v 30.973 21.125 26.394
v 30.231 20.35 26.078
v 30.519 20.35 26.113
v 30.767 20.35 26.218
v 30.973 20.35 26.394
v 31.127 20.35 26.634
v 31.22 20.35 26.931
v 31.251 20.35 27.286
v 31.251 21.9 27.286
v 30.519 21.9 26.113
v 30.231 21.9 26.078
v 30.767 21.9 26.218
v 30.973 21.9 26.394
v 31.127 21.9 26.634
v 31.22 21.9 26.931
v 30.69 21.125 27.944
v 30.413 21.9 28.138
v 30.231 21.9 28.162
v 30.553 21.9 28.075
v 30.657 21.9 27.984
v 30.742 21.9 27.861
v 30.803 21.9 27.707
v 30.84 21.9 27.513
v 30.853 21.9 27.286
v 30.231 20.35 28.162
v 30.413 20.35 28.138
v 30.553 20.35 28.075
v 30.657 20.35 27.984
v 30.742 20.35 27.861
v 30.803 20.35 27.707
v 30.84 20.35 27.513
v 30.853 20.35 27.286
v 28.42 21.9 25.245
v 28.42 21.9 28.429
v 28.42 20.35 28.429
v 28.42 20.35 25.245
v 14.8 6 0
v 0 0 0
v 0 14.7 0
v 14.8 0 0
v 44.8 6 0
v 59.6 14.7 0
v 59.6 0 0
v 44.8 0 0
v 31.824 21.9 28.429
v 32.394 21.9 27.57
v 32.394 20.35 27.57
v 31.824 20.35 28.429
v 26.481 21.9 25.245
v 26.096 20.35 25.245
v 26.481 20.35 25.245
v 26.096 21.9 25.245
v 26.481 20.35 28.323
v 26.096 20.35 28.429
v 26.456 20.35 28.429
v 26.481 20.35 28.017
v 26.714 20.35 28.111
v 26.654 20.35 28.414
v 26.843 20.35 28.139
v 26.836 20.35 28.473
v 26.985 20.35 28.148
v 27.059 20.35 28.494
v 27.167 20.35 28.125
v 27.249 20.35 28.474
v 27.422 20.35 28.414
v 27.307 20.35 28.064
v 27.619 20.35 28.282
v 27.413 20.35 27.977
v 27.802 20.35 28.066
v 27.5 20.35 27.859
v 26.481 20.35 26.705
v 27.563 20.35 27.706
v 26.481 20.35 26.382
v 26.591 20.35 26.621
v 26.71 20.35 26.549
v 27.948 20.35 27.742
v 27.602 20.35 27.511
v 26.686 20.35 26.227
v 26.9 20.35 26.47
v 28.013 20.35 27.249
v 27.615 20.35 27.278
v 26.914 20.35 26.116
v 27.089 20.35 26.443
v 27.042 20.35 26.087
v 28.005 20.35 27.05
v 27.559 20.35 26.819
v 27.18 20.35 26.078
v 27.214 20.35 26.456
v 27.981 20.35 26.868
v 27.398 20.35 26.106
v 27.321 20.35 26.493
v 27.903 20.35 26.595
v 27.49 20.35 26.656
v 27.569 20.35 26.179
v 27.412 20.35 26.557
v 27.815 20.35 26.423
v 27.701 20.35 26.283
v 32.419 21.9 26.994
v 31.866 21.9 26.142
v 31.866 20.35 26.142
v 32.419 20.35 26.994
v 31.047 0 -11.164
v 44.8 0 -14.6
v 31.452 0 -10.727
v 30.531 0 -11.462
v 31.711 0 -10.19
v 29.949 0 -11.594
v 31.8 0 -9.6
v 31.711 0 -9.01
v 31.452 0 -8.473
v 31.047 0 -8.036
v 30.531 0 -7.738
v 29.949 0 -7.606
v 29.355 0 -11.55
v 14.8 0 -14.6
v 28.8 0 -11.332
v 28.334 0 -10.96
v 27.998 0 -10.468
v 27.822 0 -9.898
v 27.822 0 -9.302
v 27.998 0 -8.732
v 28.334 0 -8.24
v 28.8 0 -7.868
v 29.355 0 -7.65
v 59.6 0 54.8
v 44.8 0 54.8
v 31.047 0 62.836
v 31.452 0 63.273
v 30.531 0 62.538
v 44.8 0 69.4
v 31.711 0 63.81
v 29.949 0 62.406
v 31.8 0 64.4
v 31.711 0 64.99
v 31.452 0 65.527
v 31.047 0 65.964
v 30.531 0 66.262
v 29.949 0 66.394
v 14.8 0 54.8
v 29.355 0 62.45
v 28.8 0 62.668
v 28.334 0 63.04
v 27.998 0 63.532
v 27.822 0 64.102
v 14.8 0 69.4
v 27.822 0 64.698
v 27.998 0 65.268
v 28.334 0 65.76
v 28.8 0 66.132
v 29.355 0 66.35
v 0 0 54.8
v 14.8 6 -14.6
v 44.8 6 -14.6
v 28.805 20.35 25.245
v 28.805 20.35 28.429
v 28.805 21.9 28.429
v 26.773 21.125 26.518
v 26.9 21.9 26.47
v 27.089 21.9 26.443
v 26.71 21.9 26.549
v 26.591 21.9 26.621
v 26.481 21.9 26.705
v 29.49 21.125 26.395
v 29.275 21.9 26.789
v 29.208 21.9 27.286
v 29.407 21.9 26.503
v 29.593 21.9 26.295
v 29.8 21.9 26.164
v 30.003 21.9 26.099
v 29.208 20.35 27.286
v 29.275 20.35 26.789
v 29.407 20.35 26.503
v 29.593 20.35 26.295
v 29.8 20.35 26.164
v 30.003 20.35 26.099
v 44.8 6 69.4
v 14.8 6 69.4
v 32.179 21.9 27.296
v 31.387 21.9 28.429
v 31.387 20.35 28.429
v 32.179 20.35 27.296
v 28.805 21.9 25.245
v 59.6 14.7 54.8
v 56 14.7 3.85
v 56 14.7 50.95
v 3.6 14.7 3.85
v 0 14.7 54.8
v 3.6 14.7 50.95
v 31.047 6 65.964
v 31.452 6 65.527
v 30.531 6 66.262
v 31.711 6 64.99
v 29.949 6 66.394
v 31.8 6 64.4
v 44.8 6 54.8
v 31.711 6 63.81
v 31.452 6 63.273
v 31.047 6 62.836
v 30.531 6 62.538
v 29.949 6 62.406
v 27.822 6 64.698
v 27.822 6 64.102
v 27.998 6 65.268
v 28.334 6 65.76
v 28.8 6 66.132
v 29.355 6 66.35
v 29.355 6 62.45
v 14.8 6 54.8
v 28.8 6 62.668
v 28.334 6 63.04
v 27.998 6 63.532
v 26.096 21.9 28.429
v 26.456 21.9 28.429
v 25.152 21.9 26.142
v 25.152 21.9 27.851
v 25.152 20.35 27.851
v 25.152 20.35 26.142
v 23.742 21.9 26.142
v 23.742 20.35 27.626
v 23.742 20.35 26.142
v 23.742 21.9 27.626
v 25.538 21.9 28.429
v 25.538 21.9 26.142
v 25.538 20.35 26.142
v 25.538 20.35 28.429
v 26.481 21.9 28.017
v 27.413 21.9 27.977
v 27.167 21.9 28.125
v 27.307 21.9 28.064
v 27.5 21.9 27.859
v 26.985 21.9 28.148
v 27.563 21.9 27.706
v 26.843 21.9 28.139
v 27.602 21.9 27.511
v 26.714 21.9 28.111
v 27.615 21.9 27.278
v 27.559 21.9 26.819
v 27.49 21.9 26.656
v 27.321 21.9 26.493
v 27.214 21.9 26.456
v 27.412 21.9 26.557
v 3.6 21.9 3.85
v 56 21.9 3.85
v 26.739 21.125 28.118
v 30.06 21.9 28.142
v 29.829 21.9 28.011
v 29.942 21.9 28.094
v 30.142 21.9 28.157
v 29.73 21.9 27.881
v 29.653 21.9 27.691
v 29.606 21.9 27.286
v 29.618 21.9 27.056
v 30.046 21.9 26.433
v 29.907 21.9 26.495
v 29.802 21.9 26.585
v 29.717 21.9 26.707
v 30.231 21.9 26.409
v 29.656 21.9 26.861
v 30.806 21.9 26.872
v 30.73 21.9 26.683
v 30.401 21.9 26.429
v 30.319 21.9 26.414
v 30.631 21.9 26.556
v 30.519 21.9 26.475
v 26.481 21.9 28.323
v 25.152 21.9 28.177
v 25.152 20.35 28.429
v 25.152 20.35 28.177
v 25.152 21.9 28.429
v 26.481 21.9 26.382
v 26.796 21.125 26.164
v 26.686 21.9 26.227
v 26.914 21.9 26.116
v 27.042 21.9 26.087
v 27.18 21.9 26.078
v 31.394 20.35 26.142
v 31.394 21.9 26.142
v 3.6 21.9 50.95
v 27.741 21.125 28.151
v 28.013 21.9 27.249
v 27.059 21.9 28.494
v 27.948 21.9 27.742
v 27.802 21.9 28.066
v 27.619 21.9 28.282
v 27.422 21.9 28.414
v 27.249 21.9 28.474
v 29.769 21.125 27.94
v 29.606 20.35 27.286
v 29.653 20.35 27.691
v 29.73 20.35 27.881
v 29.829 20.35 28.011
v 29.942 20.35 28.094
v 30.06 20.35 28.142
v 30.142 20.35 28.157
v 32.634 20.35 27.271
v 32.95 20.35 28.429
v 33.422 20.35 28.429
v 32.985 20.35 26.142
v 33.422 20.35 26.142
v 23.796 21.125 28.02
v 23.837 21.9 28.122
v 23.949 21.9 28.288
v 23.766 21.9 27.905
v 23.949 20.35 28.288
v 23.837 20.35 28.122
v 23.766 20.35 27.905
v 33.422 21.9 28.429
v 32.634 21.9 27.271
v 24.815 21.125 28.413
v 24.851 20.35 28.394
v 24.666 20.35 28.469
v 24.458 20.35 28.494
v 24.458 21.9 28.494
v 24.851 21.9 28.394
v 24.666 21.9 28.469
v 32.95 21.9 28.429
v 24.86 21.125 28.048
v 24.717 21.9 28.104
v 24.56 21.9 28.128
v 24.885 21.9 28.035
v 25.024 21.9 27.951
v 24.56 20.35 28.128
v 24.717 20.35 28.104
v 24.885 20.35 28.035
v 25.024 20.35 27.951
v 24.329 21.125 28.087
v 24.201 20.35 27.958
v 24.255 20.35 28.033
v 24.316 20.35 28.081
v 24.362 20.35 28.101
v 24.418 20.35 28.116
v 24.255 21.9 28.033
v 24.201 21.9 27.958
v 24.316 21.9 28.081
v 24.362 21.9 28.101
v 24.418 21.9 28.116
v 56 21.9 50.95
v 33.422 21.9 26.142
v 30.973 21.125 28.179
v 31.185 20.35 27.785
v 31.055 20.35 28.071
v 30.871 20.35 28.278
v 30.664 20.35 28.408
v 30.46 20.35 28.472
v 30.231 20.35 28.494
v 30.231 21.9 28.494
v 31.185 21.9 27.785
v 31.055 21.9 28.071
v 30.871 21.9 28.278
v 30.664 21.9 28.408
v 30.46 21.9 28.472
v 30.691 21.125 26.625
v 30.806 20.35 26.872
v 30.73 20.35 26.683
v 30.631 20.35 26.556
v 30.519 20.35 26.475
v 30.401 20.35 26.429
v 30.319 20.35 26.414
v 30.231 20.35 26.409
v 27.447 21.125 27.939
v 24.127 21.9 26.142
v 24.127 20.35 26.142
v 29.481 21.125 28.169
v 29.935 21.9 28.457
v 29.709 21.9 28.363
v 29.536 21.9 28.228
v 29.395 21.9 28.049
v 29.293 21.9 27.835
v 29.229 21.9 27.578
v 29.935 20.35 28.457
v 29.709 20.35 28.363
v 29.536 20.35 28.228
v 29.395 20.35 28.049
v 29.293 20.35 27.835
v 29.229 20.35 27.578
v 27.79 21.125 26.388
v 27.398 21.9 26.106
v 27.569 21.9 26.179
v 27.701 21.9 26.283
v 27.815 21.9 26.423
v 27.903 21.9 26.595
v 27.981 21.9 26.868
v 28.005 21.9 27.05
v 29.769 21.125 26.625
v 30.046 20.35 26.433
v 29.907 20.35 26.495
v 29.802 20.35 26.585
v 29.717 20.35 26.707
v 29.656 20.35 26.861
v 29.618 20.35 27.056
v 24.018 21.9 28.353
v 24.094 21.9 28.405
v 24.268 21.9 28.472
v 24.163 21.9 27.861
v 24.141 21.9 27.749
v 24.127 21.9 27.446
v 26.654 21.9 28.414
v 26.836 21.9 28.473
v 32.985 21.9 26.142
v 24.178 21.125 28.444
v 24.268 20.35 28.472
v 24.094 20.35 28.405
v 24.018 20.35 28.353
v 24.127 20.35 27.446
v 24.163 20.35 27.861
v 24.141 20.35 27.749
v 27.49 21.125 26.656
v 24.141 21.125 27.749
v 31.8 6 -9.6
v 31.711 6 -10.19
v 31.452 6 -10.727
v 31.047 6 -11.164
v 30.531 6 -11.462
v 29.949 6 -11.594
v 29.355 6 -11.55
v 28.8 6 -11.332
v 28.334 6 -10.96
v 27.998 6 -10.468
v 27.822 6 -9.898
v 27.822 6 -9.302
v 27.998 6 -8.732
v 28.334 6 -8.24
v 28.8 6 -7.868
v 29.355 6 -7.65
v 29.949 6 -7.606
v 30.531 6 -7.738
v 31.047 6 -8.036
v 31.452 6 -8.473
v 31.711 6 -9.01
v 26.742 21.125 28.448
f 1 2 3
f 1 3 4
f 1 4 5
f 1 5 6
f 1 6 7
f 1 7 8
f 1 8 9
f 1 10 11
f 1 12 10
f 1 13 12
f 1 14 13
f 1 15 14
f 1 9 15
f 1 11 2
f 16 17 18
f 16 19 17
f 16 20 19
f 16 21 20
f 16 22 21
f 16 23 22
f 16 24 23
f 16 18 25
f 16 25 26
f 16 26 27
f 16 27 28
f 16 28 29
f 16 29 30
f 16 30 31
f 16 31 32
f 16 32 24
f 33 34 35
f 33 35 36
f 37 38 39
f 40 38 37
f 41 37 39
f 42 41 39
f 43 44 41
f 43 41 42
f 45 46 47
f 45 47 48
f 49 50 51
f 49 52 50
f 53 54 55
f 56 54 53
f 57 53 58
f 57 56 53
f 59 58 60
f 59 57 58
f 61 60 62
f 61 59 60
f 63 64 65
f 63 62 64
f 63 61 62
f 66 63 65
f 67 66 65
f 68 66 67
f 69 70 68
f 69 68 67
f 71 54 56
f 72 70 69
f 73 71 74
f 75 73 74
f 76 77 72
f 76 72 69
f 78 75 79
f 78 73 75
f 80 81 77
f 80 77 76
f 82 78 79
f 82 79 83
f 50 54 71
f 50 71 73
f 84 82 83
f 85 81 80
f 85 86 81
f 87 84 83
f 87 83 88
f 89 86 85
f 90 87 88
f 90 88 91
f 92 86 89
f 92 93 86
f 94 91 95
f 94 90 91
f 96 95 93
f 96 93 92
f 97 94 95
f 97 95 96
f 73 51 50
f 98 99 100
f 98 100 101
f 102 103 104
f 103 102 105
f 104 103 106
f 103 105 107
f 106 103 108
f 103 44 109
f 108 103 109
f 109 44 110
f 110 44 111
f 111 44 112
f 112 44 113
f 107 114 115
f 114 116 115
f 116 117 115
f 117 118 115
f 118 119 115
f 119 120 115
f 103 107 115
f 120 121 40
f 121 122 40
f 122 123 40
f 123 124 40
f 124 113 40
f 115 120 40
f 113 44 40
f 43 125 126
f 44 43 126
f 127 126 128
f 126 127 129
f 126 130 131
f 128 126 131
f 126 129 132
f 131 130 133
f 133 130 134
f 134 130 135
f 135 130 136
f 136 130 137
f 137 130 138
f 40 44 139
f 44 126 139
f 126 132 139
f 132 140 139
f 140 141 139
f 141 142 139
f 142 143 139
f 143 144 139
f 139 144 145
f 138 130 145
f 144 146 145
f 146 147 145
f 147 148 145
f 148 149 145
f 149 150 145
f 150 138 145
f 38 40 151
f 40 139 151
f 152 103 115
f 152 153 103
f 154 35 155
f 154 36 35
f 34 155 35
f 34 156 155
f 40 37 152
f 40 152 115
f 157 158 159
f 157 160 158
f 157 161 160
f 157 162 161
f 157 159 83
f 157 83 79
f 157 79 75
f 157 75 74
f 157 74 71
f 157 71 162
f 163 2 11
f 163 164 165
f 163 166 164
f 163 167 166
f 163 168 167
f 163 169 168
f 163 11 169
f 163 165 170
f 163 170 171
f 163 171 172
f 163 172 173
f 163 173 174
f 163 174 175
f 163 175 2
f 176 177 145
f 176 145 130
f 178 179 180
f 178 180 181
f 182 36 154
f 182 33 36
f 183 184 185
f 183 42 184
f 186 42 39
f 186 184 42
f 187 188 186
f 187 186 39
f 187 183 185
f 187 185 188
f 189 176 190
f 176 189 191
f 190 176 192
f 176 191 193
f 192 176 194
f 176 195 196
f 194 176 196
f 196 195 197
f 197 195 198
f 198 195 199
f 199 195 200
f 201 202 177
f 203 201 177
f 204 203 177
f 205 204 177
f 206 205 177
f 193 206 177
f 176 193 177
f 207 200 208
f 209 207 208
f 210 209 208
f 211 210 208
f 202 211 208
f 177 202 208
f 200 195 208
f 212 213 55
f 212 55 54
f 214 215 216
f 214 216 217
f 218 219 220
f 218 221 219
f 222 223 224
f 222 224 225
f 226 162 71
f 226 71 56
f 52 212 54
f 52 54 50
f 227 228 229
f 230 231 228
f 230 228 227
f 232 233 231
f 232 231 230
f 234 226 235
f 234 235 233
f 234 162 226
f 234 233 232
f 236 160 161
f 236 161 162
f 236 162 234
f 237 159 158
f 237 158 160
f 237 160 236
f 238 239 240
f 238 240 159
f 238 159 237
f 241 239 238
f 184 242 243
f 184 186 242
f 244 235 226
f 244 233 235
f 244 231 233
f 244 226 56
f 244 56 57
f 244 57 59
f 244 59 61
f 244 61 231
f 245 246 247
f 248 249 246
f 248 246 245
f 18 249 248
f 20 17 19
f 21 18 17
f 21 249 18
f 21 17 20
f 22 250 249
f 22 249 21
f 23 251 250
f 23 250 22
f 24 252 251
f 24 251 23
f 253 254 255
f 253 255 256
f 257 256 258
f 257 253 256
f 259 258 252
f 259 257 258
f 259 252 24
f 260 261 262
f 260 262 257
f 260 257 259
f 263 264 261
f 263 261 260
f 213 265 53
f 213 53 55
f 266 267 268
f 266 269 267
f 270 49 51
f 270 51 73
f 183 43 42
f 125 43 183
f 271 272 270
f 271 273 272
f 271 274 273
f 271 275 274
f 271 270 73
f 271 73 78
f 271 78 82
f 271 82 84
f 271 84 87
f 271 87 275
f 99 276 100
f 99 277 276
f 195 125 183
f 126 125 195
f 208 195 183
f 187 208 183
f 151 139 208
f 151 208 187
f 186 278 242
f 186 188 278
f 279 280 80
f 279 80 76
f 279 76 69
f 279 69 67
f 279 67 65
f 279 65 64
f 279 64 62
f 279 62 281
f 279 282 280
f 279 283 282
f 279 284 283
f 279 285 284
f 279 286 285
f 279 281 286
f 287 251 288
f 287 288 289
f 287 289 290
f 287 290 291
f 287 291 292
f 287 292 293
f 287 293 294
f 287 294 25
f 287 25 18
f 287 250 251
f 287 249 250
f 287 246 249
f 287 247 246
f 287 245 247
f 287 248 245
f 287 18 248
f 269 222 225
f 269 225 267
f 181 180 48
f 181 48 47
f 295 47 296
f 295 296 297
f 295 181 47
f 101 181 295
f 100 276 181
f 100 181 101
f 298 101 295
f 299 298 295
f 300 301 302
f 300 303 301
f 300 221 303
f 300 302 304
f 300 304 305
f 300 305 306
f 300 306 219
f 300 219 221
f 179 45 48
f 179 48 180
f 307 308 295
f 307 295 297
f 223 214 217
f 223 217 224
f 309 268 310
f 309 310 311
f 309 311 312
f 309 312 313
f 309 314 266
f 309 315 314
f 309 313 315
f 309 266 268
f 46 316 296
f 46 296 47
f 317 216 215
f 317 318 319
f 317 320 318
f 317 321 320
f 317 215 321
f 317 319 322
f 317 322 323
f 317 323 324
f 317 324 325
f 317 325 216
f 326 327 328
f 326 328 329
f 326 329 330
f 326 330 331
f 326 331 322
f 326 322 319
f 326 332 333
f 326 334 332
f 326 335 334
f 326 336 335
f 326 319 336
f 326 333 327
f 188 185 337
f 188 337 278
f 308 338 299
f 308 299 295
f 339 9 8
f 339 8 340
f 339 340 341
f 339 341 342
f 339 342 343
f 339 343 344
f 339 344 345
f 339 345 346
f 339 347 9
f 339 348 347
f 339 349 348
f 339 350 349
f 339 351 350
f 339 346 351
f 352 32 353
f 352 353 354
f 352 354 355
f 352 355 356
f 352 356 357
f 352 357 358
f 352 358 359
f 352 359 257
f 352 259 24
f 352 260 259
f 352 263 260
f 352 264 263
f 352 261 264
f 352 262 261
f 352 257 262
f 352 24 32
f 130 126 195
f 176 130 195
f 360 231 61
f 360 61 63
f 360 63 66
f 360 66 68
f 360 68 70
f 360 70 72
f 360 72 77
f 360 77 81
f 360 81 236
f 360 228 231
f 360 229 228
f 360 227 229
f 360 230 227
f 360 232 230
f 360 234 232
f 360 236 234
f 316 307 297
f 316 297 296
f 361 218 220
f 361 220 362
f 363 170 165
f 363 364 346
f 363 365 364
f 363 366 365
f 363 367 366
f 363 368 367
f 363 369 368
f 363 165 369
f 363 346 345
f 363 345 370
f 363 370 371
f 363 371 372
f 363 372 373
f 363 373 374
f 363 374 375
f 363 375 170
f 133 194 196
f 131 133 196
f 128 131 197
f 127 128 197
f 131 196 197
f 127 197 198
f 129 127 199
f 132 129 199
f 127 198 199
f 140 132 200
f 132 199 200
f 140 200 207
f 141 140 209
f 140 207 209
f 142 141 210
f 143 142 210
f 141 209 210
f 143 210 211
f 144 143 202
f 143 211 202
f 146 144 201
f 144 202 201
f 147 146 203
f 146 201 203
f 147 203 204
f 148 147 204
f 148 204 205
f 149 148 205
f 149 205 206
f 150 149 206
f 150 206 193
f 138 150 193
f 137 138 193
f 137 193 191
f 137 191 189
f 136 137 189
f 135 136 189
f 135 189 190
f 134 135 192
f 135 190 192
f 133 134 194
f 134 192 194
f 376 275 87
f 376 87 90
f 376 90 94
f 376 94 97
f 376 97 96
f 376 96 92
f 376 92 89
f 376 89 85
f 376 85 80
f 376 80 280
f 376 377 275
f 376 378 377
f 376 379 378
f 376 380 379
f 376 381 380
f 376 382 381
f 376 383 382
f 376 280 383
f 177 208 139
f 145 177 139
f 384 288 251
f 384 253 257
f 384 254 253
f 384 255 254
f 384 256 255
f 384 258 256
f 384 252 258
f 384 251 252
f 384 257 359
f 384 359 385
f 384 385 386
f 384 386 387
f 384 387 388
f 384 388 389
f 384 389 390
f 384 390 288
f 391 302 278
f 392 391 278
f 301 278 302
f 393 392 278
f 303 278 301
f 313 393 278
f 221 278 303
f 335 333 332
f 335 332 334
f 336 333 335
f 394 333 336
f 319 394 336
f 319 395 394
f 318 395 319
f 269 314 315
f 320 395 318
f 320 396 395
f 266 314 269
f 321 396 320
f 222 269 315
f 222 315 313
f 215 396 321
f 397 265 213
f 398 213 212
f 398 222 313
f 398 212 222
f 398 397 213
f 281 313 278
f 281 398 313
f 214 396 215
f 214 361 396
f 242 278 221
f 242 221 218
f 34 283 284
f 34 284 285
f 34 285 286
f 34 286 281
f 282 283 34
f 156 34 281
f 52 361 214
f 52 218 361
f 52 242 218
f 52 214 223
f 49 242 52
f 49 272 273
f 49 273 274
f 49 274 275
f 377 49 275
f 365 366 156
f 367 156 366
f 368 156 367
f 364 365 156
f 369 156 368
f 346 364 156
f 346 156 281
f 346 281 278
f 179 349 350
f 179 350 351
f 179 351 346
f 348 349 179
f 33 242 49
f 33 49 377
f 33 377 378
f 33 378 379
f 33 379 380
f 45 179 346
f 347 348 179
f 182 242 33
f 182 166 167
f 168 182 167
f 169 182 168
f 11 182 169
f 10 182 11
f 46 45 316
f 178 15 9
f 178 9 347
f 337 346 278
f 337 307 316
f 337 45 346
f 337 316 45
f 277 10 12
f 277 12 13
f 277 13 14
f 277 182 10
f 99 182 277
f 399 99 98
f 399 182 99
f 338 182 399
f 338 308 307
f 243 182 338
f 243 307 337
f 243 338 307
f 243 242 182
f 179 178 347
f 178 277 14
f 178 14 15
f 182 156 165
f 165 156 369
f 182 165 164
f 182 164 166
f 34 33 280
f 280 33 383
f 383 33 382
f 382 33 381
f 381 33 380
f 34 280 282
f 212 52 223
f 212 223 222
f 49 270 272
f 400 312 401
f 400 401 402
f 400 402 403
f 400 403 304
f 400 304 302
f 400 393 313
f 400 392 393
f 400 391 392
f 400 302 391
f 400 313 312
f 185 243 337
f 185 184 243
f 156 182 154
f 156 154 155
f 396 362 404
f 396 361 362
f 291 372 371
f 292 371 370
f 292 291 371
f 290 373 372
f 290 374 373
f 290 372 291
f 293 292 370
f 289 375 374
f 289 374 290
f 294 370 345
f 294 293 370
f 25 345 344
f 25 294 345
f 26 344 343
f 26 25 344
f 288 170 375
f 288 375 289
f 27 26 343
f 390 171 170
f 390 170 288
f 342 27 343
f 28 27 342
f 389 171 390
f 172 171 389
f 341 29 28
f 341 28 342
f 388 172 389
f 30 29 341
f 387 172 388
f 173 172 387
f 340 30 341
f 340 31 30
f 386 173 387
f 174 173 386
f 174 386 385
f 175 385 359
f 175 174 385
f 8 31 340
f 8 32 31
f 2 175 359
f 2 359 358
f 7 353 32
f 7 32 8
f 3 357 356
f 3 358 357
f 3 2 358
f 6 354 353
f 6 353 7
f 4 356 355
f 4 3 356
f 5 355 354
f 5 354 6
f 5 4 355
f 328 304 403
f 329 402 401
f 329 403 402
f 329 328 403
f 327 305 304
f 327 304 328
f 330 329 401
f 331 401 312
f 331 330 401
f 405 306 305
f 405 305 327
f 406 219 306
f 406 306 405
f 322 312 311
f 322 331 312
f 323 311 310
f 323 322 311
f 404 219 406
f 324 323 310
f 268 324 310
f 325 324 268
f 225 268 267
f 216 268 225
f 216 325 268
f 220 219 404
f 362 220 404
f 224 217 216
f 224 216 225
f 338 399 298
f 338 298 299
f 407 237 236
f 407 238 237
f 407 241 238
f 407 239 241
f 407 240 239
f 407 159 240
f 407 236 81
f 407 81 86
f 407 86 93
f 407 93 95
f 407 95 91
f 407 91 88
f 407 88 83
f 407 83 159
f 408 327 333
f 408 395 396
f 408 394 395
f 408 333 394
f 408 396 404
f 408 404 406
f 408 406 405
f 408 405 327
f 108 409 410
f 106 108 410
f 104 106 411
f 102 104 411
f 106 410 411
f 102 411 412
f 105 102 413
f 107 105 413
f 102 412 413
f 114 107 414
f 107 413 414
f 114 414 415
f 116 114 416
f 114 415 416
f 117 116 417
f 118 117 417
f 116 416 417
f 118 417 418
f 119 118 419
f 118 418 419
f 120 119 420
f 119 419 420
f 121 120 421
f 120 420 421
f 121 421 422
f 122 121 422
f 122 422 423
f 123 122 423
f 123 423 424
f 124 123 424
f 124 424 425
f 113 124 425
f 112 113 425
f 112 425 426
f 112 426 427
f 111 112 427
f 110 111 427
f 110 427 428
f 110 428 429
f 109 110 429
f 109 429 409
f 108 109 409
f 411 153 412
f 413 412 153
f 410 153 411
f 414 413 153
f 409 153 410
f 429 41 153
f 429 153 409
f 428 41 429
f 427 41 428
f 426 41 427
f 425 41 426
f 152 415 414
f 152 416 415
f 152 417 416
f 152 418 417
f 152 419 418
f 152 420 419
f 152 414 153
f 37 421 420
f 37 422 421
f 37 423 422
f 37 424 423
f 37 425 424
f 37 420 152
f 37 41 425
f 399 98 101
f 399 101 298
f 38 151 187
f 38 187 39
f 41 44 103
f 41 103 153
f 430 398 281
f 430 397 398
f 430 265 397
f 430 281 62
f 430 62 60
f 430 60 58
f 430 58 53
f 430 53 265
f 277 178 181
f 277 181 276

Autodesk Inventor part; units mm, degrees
ref_plane "YZ Plane" through (0, 0, 0) normal (1, 0, 0) x (0, 1, 0)
ref_plane "XZ Plane" through (0, 0, 0) normal (0, 1, 0) x (-1, 0, 0)
ref_plane "XY Plane" through (0, 0, 0) normal (0, 0, 1) x (1, 0, 0)
sketch "스케치1" plane through (0, 0, 0) normal (0, 1, 0) x (-1, 0, 0)
  line L0 (0, 0) -> (-59.6, 0)
  line L1 (-59.6, 0) -> (-59.6, 54.8)
  line L2 (-59.6, 54.8) -> (0, 54.8)
  line L3 (0, 54.8) -> (0, 0)
  dimension "d0" = 59.6
  dimension "d1" = 54.8
extrude "돌출1" add sketch "스케치1" along normal blind 14.7
sketch "스케치3" plane through (0, 14.7, 0) normal (0, 1, 0) x (1, 0, 0)
  line L0 (3.6, -3.85) -> (56, -3.85)
  line L1 (56, -3.85) -> (56, -50.95)
  line L2 (56, -50.95) -> (3.6, -50.95)
  line L3 (3.6, -50.95) -> (3.6, -3.85)
  point P0 (0, 0)
  dimension "d10" = 52.4
  dimension "d11" = 47.1
extrude "돌출2" add sketch "스케치3" along normal blind 7.2
sketch "스케치4" plane through (0, 21.9, 0) normal (0, 1, 0) x (1, 0, 0)
  line L0 (23.4801, -25.2454) -> (33.4417, -25.2454) construction
  line L1 (33.4417, -25.2454) -> (33.4417, -28.4935) construction
  line L2 (33.4417, -28.4935) -> (23.4801, -28.4935) construction
  line L3 (23.4801, -28.4935) -> (23.4801, -25.2454) construction
  line L4 (25.5376, -28.4293) -> (25.1523, -28.4293)
  line L5 (25.1523, -28.4293) -> (25.1523, -28.1773)
  spline S0 degree 2 poles (25.1523, -28.1773) (24.9745, -28.3329) (24.6558, -28.4935) (24.4582, -28.4935) knots 0 0 0 1 2 2 2
  spline S1 degree 2 poles (24.4582, -28.4935) (24.31, -28.4935) (24.0457, -28.3947) (23.9494, -28.2885) knots 0 0 0 1 2 2 2
  spline S2 degree 2 poles (23.9494, -28.2885) (23.8506, -28.1823) (23.7419, -27.8587) (23.7419, -27.6265) knots 0 0 0 1 2 2 2
  line L6 (23.7419, -27.6265) -> (23.7419, -26.142)
  line L7 (23.7419, -26.142) -> (24.1272, -26.142)
  line L8 (24.1272, -26.142) -> (24.1272, -27.4462)
  spline S3 degree 2 poles (24.1272, -27.4462) (24.1272, -27.629) (24.1544, -27.8686) (24.2013, -27.9575) knots 0 0 0 1 2 2 2
  spline S4 degree 2 poles (24.2013, -27.9575) (24.2483, -28.0464) (24.4088, -28.1279) (24.5595, -28.1279) knots 0 0 0 1 2 2 2
  spline S5 degree 2 poles (24.5595, -28.1279) (24.7003, -28.1279) (25.0189, -27.9674) (25.1523, -27.8513) knots 0 0 0 1 2 2 2
  line L9 (25.1523, -27.8513) -> (25.1523, -26.142)
  line L10 (25.1523, -26.142) -> (25.5376, -26.142)
  line L11 (25.5376, -26.142) -> (25.5376, -28.4293)
  spline S6 degree 2 poles (28.0126, -27.2486) (28.0126, -27.8093) (27.4692, -28.4935) (27.0591, -28.4935) knots 0 0 0 1 2 2 2
  spline S7 degree 2 poles (27.0591, -28.4935) (26.8739, -28.4935) (26.6096, -28.4021) (26.4812, -28.3231) knots 0 0 0 1 2 2 2
  line L12 (26.4812, -28.3231) -> (26.4565, -28.4293)
  line L13 (26.4565, -28.4293) -> (26.0958, -28.4293)
  line L14 (26.0958, -28.4293) -> (26.0958, -25.2454)
  line L15 (26.0958, -25.2454) -> (26.4812, -25.2454)
  line L16 (26.4812, -25.2454) -> (26.4812, -26.3816)
  spline S8 degree 2 poles (26.4812, -26.3816) (26.6269, -26.2507) (26.9653, -26.0778) (27.1802, -26.0778) knots 0 0 0 1 2 2 2
  spline S9 degree 2 poles (27.1802, -26.0778) (27.568, -26.0778) (28.0126, -26.6978) (28.0126, -27.2486) knots 0 0 0 1 2 2 2
  spline S10 degree 2 poles (27.6149, -27.2782) (27.6149, -26.8682) (27.3654, -26.4434) (27.0888, -26.4434) knots 0 0 0 1 2 2 2
  spline S11 degree 2 poles (27.0888, -26.4434) (26.9332, -26.4434) (26.6121, -26.5916) (26.4812, -26.7052) knots 0 0 0 1 2 2 2
  line L17 (26.4812, -26.7052) -> (26.4812, -28.0168)
  spline S12 degree 2 poles (26.4812, -28.0168) (26.6269, -28.0884) (26.8517, -28.1477) (26.985, -28.1477) knots 0 0 0 1 2 2 2
  spline S13 degree 2 poles (26.985, -28.1477) (27.279, -28.1477) (27.6149, -27.7302) (27.6149, -27.2782) knots 0 0 0 1 2 2 2
  line L18 (28.8054, -28.4293) -> (28.4201, -28.4293)
  line L19 (28.4201, -28.4293) -> (28.4201, -25.2454)
  line L20 (28.4201, -25.2454) -> (28.8054, -25.2454)
  line L21 (28.8054, -25.2454) -> (28.8054, -28.4293)
  spline S14 degree 2 poles (31.2508, -27.2856) (31.2508, -27.8636) (30.695, -28.4935) (30.2306, -28.4935) knots 0 0 0 1 2 2 2
  spline S15 degree 2 poles (30.2306, -28.4935) (29.7539, -28.4935) (29.2081, -27.8439) (29.2081, -27.2856) knots 0 0 0 1 2 2 2
  spline S16 degree 2 poles (29.2081, -27.2856) (29.2081, -26.7126) (29.7712, -26.0778) (30.2306, -26.0778) knots 0 0 0 1 2 2 2
  spline S17 degree 2 poles (30.2306, -26.0778) (30.695, -26.0778) (31.2508, -26.7101) (31.2508, -27.2856) knots 0 0 0 1 2 2 2
  spline S18 degree 2 poles (30.8531, -27.2856) (30.8531, -26.841) (30.5295, -26.4088) (30.2306, -26.4088) knots 0 0 0 1 2 2 2
  spline S19 degree 2 poles (30.2306, -26.4088) (29.9318, -26.4088) (29.6057, -26.841) (29.6057, -27.2856) knots 0 0 0 1 2 2 2
  spline S20 degree 2 poles (29.6057, -27.2856) (29.6057, -27.7179) (29.9318, -28.1625) (30.2306, -28.1625) knots 0 0 0 1 2 2 2
  spline S21 degree 2 poles (30.2306, -28.1625) (30.5271, -28.1625) (30.8531, -27.7253) (30.8531, -27.2856) knots 0 0 0 1 2 2 2
  line L22 (33.4219, -28.4293) -> (32.9501, -28.4293)
  line L23 (32.9501, -28.4293) -> (32.3944, -27.5697)
  line L24 (32.3944, -27.5697) -> (31.8238, -28.4293)
  line L25 (31.8238, -28.4293) -> (31.3866, -28.4293)
  line L26 (31.3866, -28.4293) -> (32.1795, -27.2955)
  line L27 (32.1795, -27.2955) -> (31.394, -26.142)
  line L28 (31.394, -26.142) -> (31.8658, -26.142)
  line L29 (31.8658, -26.142) -> (32.4191, -26.9942)
  line L30 (32.4191, -26.9942) -> (32.9847, -26.142)
  line L31 (32.9847, -26.142) -> (33.4219, -26.142)
  line L32 (33.4219, -26.142) -> (32.634, -27.2708)
  line L33 (32.634, -27.2708) -> (33.4219, -28.4293)
  point P0 (0, 0)
extrude "돌출3" cut sketch "스케치4" against normal blind 1.55
sketch "스케치5" plane through (0, 0, 54.8) normal (0, 0, 1) x (1, 0, 0)
  line L0 (14.8, 0) -> (44.8, 0)
  line L1 (44.8, 0) -> (44.8, 6)
  line L2 (44.8, 6) -> (14.8, 6)
  line L3 (14.8, 6) -> (14.8, 0)
  point P0 (0, 0)
  dimension "d16" = 30
  dimension "d17" = 6
sketch "스케치6" plane through (59.6, 0, 0) normal (0, 0, -1) x (-1, 0, 0)
  line L0 (44.8, 0) -> (14.8, 0)
  line L1 (14.8, 0) -> (14.8, 6)
  line L2 (14.8, 6) -> (44.8, 6)
  line L3 (44.8, 6) -> (44.8, 0)
  point P0 (59.6, 0)
  dimension "d18" = 30
  dimension "d19" = 6
extrude "돌출4" add sketch "스케치6" along normal blind 14.6
extrude "돌출5" add sketch "스케치5" along normal blind 14.6
sketch "스케치10" plane through (14.8, 6, 54.8) normal (0, 1, 0) x (1, 0, 0)
  circle A0 centre (15, -9.6) radius 2
  point P0 (-14.8, 54.8)
  dimension "d25" = 4
sketch "스케치12" plane through (14.8, 6, 0) normal (0, 1, 0) x (1, 0, 0)
  circle A0 centre (15, 9.6) radius 2
  point P0 (-14.8, 0)
  dimension "d27" = 4
extrude "돌출6" cut sketch "스케치10" against normal blind 70.15
extrude "돌출7" cut sketch "스케치12" against normal blind 104.1
properties part number "gps_antenna"
